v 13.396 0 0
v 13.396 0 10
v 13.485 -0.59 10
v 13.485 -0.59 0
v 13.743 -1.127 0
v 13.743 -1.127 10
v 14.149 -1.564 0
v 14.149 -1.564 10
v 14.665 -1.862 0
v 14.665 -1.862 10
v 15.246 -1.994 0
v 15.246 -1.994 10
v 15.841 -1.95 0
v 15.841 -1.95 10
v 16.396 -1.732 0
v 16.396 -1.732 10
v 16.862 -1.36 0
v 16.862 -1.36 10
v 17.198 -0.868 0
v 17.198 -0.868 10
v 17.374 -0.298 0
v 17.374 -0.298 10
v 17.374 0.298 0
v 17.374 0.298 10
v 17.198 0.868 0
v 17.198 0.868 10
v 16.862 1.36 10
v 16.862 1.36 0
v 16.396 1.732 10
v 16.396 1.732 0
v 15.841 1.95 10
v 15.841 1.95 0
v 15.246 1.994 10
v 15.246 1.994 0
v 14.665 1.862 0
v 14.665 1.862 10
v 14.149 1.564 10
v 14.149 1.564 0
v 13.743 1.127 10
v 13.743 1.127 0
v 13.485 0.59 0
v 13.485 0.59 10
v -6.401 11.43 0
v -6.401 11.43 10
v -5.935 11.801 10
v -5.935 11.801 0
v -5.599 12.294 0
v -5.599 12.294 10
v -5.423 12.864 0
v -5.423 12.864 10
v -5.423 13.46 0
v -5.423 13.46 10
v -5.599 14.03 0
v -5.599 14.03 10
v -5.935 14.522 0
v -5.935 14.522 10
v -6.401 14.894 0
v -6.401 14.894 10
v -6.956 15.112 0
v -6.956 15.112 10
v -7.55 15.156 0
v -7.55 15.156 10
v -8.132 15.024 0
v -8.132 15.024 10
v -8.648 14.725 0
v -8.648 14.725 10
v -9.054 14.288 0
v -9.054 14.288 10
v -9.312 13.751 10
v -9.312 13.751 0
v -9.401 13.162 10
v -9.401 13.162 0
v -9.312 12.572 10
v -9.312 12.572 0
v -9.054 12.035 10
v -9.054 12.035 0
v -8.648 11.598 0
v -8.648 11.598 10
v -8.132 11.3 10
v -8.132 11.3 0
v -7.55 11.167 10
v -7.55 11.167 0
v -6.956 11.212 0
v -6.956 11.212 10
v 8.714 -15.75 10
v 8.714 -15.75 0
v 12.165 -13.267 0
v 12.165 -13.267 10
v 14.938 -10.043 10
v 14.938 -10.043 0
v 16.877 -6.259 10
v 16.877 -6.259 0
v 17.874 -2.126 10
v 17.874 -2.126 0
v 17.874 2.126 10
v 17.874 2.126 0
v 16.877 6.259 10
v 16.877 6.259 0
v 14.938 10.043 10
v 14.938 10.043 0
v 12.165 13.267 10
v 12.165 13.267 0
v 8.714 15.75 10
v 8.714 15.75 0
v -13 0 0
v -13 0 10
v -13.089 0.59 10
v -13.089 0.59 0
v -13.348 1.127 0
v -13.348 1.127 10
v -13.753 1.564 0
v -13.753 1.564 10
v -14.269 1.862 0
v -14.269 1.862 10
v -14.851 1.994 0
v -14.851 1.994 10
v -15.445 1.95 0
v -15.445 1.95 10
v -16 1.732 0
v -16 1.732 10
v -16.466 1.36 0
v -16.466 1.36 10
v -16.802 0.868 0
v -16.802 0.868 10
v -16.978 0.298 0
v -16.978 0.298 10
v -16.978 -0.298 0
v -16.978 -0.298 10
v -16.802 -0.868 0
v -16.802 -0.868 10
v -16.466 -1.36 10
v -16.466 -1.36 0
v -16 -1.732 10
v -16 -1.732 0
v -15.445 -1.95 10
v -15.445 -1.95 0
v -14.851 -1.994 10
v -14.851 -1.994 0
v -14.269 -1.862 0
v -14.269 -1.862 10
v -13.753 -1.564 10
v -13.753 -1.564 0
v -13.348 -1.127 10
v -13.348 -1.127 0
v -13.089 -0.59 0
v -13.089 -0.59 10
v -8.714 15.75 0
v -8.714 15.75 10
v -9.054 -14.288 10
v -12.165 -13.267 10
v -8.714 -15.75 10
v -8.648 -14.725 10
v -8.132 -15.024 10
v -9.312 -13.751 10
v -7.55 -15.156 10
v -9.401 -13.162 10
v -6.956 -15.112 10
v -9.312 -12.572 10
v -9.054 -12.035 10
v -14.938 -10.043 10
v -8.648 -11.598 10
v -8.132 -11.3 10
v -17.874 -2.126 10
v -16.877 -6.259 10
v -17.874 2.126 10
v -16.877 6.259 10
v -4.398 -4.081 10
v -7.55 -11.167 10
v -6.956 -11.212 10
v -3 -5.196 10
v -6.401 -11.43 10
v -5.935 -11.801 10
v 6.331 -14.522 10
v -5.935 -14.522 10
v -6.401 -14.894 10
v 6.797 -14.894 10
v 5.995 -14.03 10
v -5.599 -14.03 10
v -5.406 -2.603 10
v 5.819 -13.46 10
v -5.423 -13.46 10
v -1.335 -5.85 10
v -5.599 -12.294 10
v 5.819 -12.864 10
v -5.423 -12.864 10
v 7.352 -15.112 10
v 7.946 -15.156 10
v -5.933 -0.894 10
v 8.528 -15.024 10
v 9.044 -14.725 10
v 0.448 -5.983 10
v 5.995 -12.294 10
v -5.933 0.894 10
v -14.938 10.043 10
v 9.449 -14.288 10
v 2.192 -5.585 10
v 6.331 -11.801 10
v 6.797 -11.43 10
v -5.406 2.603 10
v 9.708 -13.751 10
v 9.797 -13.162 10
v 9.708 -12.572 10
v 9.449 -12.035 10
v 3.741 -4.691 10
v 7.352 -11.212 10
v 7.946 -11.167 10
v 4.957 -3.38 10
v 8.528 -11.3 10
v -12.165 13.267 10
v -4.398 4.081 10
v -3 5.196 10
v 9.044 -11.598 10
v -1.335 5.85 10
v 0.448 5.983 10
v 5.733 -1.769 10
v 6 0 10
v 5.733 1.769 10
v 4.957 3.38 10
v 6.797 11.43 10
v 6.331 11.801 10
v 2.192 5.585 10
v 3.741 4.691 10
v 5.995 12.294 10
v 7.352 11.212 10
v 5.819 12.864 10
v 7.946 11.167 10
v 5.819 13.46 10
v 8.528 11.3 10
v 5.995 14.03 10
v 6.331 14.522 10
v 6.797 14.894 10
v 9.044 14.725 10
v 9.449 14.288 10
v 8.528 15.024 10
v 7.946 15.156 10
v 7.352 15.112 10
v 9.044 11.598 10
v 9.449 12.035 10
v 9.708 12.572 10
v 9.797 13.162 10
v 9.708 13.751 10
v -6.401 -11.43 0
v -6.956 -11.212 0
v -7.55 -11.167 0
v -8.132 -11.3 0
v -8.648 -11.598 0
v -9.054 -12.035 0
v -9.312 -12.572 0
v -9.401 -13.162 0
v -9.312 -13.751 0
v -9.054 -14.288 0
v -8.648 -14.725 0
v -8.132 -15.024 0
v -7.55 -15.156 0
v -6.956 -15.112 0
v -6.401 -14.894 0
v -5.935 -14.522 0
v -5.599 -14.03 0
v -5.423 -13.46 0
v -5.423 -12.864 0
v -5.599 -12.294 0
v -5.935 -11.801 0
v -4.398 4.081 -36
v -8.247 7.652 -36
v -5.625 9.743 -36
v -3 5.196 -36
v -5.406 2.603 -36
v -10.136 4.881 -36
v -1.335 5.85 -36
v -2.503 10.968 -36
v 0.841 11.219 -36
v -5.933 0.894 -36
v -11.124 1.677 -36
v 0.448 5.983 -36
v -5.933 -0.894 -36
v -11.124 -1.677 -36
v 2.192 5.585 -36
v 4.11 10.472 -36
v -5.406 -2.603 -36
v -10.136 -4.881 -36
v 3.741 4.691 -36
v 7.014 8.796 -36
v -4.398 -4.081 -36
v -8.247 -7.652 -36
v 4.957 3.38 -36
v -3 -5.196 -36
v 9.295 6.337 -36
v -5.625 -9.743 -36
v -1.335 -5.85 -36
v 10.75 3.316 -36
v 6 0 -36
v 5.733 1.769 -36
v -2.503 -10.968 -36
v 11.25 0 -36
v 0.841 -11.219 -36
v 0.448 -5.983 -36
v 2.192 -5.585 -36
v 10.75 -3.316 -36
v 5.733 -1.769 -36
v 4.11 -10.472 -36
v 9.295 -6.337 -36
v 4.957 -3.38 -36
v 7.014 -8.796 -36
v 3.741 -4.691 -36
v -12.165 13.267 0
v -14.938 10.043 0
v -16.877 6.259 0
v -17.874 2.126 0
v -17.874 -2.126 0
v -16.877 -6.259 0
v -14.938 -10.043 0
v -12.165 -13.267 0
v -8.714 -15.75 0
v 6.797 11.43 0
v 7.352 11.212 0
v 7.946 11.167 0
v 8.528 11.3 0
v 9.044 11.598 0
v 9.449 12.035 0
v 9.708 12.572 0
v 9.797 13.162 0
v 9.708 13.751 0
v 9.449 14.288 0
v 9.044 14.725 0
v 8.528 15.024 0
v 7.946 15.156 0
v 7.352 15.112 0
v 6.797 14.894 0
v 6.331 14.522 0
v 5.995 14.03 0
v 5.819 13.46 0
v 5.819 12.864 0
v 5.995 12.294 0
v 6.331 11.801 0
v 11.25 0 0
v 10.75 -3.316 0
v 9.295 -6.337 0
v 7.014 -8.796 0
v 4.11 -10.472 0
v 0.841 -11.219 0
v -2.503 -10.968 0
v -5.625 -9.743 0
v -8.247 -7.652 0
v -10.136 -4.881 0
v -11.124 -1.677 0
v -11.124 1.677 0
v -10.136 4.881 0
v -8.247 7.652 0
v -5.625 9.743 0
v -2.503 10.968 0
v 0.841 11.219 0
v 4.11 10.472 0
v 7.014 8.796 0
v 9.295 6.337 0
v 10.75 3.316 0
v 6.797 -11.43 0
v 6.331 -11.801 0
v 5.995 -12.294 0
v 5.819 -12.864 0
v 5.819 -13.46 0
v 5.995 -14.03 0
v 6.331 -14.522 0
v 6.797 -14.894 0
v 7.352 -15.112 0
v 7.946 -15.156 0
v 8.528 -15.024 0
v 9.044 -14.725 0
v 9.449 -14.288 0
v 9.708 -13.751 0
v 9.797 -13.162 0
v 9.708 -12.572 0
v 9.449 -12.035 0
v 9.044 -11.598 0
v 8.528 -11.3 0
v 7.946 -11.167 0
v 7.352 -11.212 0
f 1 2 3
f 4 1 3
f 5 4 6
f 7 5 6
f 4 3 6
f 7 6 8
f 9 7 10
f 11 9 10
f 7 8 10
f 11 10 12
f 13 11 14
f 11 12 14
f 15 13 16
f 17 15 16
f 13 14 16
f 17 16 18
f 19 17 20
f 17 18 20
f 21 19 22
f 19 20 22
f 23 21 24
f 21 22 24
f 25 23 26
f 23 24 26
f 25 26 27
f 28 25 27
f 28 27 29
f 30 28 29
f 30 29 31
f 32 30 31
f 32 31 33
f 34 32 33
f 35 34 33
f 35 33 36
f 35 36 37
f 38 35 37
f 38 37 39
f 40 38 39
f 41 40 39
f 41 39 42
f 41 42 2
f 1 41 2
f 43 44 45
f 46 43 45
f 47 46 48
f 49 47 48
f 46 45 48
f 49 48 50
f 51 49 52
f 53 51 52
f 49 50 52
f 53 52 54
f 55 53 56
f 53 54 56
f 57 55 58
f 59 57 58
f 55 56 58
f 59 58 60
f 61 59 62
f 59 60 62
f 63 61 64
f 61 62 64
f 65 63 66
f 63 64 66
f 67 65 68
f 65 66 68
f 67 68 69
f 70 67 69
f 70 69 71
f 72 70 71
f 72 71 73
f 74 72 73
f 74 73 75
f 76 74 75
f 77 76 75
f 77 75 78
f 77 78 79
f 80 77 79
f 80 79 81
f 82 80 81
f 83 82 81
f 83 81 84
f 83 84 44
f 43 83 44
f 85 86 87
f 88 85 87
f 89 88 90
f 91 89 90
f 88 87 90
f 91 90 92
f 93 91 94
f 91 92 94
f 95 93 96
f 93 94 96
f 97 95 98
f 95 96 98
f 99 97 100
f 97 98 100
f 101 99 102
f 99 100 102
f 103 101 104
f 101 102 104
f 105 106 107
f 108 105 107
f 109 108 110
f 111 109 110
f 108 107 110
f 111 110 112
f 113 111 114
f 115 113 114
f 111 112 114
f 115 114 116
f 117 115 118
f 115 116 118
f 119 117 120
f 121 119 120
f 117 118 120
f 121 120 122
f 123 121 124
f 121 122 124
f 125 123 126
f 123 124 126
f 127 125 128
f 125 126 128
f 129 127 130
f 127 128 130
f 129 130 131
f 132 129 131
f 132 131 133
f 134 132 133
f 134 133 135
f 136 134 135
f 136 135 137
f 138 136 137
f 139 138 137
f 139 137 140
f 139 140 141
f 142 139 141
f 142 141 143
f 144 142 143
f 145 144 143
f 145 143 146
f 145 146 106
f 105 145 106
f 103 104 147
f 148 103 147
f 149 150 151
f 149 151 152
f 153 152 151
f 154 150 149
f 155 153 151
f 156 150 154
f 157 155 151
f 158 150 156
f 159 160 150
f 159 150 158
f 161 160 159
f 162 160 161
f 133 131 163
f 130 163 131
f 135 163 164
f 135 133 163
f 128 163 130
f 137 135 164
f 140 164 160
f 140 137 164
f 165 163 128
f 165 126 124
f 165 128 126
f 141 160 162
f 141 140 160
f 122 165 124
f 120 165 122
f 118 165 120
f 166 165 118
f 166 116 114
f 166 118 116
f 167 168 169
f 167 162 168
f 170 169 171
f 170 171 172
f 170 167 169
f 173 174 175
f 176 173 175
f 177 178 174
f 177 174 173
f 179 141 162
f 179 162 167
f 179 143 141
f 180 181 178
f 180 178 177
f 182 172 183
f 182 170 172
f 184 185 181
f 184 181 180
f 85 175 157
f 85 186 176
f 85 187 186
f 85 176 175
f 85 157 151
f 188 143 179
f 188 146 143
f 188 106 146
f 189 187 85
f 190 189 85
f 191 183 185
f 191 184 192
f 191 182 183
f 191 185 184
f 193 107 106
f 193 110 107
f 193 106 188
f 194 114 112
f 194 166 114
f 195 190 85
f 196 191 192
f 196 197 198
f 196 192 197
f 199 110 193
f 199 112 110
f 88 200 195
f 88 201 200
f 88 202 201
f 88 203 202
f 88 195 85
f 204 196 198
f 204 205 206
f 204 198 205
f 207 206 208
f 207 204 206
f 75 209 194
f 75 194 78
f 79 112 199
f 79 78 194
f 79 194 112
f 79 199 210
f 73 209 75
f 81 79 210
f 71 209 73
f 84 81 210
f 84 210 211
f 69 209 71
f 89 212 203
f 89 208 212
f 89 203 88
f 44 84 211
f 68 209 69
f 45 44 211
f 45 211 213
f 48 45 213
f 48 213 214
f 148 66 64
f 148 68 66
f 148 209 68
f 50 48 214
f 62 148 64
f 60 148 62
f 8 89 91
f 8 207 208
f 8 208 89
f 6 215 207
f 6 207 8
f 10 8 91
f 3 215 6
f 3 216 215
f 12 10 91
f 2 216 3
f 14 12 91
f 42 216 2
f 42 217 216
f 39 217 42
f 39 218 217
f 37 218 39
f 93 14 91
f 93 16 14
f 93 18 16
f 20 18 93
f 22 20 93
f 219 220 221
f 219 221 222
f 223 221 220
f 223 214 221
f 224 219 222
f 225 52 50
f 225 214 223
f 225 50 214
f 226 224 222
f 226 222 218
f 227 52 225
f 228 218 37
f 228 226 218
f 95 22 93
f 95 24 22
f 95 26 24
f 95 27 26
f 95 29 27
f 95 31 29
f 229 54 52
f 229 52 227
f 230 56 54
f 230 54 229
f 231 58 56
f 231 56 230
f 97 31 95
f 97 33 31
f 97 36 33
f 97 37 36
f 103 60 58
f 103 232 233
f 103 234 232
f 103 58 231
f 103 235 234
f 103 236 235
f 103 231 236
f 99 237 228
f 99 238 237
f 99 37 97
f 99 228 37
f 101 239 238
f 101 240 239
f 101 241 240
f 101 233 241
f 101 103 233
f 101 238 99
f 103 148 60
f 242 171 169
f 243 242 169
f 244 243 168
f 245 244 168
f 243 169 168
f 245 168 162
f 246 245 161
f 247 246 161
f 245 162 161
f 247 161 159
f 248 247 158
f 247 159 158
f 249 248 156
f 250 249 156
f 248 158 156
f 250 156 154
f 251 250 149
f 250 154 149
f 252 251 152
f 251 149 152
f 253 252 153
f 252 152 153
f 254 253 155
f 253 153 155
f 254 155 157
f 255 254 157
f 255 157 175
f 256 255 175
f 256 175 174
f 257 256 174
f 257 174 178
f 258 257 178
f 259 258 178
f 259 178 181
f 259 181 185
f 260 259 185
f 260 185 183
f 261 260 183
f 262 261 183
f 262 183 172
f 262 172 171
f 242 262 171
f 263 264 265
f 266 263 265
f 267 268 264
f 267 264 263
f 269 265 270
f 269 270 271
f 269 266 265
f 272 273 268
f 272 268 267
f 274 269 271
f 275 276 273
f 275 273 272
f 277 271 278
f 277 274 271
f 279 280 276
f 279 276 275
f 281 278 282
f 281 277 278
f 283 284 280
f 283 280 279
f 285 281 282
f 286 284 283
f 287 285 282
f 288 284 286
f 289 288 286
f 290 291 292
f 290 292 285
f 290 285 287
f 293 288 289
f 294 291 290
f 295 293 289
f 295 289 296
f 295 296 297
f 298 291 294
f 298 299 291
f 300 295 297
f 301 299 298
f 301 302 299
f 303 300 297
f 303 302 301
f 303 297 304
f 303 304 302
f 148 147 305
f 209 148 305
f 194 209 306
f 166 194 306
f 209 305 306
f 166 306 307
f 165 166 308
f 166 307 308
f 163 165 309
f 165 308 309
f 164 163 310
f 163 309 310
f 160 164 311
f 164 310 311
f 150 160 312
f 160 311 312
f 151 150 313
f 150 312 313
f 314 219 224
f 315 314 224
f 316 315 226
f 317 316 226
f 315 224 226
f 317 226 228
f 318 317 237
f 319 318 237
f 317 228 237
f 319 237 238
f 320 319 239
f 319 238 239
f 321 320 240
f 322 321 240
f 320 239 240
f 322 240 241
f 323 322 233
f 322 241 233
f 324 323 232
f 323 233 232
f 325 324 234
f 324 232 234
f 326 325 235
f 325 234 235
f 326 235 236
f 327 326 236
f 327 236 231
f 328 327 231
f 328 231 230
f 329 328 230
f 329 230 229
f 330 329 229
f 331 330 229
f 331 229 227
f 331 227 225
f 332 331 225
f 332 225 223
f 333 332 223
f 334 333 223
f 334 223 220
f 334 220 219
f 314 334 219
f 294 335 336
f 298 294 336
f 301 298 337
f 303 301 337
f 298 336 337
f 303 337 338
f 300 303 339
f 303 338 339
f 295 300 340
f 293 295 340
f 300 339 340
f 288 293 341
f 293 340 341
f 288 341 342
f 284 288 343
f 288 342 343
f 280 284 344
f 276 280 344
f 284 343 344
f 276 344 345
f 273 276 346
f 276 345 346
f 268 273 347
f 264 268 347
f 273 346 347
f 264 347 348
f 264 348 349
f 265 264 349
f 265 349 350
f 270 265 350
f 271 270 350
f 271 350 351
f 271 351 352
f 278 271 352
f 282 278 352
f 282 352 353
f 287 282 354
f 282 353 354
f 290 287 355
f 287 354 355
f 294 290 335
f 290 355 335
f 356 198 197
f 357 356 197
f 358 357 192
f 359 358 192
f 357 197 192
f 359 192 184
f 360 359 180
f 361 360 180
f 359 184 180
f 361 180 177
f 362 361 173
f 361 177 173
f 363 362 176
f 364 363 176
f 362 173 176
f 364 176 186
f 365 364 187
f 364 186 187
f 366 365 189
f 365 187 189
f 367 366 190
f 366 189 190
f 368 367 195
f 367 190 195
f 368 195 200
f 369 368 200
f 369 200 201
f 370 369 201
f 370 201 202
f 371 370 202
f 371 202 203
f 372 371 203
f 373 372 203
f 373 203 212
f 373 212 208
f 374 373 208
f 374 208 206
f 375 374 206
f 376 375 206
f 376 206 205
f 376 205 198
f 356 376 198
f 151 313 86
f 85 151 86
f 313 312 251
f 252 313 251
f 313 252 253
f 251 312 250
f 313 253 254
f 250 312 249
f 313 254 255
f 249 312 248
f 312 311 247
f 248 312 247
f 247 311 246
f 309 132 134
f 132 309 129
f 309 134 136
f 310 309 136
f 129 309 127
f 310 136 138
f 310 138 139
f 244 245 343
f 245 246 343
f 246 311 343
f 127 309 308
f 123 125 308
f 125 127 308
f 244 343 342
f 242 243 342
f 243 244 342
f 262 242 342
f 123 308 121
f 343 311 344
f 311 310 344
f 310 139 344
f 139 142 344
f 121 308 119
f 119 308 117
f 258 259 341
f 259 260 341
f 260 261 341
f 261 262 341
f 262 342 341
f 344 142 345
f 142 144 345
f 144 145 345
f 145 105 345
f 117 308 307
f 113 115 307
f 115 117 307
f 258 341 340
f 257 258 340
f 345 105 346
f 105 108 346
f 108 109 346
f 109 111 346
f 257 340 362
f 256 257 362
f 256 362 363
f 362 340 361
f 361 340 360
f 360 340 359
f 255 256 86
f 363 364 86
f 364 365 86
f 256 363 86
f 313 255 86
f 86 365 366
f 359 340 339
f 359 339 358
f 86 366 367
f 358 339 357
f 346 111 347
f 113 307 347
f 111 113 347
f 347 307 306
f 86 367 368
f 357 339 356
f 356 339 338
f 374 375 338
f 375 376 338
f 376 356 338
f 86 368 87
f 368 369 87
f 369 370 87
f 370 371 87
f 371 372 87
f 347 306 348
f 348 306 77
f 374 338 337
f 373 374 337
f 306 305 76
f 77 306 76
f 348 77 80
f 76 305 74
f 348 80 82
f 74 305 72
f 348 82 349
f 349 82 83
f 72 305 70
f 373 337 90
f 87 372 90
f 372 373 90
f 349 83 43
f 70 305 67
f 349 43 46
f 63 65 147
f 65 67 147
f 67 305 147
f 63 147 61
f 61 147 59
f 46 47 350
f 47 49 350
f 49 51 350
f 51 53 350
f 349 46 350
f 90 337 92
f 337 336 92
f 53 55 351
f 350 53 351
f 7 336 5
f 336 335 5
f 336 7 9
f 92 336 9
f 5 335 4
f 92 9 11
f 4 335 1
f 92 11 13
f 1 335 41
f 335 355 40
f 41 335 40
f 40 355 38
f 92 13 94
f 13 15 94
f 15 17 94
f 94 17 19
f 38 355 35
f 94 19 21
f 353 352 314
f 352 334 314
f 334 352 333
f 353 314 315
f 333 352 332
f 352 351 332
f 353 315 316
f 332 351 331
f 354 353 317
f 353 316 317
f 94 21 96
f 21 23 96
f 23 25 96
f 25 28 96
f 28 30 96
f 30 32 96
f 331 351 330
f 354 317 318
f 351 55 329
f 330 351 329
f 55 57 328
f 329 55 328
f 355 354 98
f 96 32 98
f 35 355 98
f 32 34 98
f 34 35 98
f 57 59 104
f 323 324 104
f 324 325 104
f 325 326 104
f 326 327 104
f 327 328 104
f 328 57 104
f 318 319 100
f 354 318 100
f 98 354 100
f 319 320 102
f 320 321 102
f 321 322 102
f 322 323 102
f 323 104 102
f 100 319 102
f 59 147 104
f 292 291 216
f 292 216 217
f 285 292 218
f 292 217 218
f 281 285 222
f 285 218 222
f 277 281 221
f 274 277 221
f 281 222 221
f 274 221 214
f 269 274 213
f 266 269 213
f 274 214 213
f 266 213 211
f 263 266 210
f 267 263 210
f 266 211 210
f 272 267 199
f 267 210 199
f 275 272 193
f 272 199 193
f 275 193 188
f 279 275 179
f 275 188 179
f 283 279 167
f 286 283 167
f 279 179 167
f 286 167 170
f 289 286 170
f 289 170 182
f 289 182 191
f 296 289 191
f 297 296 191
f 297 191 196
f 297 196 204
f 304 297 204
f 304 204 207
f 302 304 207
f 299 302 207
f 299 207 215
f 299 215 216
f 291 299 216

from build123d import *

# Parameters (mm, degrees)
SALIENTE_EXTRUIR1_DEPTH = 10
CROQUIS2_R              = 2
CORTAR_EXTRUIR1_DEPTH   = 18
MATRIZC1_COUNT          = 6
CROQUIS4_R              = 11.25
SALIENTE_EXTRUIR2_DEPTH = 36
CROQUIS5_R              = 6
CORTAR_EXTRUIR2_DEPTH   = 53


with BuildPart() as part:
    # Croquis1 → Saliente-Extruir1 (new body)
    with BuildSketch(Plane.XY):
        with BuildLine():
            Line((-8.714212529, -15.75), (8.714212529, -15.75))
            ThreePointArc((8.714212529, -15.75), (18, 0), (8.714212529, 15.75))
            Line((8.714212529, 15.75), (-8.714212529, 15.75))
            ThreePointArc((-8.714212529, 15.75), (-18, 0), (-8.714212529, -15.75))
        make_face()
    extrude(amount=SALIENTE_EXTRUIR1_DEPTH)

    # Croquis2 → Cortar-Extruir1 (cut)
    with BuildSketch(Plane.XY.offset(10)):
        with Locations((-15, 0)):
            Circle(CROQUIS2_R)
    cortar_extruir1 = extrude(amount=-CORTAR_EXTRUIR1_DEPTH, mode=Mode.SUBTRACT)

    # MatrizC1: Cortar-Extruir1 ×6 about axis
    matrizc1_axis = Axis((0.197930151, 0, 10), (0, 0, 1))
    for i in range(1, MATRIZC1_COUNT):
        add(cortar_extruir1.rotate(matrizc1_axis, i * 360 / MATRIZC1_COUNT), mode=Mode.SUBTRACT)

    # Croquis4 → Saliente-Extruir2 (add)
    with BuildSketch(Plane(origin=(0, 0, 0), x_dir=(-1, 0, 0), z_dir=(0, 0, -1))):
        Circle(CROQUIS4_R)
    extrude(amount=SALIENTE_EXTRUIR2_DEPTH)

    # Croquis5 → Cortar-Extruir2 (cut)
    with BuildSketch(Plane.XY.offset(10)):
        Circle(CROQUIS5_R)
    extrude(amount=-CORTAR_EXTRUIR2_DEPTH, mode=Mode.SUBTRACT)


solid = part.part
